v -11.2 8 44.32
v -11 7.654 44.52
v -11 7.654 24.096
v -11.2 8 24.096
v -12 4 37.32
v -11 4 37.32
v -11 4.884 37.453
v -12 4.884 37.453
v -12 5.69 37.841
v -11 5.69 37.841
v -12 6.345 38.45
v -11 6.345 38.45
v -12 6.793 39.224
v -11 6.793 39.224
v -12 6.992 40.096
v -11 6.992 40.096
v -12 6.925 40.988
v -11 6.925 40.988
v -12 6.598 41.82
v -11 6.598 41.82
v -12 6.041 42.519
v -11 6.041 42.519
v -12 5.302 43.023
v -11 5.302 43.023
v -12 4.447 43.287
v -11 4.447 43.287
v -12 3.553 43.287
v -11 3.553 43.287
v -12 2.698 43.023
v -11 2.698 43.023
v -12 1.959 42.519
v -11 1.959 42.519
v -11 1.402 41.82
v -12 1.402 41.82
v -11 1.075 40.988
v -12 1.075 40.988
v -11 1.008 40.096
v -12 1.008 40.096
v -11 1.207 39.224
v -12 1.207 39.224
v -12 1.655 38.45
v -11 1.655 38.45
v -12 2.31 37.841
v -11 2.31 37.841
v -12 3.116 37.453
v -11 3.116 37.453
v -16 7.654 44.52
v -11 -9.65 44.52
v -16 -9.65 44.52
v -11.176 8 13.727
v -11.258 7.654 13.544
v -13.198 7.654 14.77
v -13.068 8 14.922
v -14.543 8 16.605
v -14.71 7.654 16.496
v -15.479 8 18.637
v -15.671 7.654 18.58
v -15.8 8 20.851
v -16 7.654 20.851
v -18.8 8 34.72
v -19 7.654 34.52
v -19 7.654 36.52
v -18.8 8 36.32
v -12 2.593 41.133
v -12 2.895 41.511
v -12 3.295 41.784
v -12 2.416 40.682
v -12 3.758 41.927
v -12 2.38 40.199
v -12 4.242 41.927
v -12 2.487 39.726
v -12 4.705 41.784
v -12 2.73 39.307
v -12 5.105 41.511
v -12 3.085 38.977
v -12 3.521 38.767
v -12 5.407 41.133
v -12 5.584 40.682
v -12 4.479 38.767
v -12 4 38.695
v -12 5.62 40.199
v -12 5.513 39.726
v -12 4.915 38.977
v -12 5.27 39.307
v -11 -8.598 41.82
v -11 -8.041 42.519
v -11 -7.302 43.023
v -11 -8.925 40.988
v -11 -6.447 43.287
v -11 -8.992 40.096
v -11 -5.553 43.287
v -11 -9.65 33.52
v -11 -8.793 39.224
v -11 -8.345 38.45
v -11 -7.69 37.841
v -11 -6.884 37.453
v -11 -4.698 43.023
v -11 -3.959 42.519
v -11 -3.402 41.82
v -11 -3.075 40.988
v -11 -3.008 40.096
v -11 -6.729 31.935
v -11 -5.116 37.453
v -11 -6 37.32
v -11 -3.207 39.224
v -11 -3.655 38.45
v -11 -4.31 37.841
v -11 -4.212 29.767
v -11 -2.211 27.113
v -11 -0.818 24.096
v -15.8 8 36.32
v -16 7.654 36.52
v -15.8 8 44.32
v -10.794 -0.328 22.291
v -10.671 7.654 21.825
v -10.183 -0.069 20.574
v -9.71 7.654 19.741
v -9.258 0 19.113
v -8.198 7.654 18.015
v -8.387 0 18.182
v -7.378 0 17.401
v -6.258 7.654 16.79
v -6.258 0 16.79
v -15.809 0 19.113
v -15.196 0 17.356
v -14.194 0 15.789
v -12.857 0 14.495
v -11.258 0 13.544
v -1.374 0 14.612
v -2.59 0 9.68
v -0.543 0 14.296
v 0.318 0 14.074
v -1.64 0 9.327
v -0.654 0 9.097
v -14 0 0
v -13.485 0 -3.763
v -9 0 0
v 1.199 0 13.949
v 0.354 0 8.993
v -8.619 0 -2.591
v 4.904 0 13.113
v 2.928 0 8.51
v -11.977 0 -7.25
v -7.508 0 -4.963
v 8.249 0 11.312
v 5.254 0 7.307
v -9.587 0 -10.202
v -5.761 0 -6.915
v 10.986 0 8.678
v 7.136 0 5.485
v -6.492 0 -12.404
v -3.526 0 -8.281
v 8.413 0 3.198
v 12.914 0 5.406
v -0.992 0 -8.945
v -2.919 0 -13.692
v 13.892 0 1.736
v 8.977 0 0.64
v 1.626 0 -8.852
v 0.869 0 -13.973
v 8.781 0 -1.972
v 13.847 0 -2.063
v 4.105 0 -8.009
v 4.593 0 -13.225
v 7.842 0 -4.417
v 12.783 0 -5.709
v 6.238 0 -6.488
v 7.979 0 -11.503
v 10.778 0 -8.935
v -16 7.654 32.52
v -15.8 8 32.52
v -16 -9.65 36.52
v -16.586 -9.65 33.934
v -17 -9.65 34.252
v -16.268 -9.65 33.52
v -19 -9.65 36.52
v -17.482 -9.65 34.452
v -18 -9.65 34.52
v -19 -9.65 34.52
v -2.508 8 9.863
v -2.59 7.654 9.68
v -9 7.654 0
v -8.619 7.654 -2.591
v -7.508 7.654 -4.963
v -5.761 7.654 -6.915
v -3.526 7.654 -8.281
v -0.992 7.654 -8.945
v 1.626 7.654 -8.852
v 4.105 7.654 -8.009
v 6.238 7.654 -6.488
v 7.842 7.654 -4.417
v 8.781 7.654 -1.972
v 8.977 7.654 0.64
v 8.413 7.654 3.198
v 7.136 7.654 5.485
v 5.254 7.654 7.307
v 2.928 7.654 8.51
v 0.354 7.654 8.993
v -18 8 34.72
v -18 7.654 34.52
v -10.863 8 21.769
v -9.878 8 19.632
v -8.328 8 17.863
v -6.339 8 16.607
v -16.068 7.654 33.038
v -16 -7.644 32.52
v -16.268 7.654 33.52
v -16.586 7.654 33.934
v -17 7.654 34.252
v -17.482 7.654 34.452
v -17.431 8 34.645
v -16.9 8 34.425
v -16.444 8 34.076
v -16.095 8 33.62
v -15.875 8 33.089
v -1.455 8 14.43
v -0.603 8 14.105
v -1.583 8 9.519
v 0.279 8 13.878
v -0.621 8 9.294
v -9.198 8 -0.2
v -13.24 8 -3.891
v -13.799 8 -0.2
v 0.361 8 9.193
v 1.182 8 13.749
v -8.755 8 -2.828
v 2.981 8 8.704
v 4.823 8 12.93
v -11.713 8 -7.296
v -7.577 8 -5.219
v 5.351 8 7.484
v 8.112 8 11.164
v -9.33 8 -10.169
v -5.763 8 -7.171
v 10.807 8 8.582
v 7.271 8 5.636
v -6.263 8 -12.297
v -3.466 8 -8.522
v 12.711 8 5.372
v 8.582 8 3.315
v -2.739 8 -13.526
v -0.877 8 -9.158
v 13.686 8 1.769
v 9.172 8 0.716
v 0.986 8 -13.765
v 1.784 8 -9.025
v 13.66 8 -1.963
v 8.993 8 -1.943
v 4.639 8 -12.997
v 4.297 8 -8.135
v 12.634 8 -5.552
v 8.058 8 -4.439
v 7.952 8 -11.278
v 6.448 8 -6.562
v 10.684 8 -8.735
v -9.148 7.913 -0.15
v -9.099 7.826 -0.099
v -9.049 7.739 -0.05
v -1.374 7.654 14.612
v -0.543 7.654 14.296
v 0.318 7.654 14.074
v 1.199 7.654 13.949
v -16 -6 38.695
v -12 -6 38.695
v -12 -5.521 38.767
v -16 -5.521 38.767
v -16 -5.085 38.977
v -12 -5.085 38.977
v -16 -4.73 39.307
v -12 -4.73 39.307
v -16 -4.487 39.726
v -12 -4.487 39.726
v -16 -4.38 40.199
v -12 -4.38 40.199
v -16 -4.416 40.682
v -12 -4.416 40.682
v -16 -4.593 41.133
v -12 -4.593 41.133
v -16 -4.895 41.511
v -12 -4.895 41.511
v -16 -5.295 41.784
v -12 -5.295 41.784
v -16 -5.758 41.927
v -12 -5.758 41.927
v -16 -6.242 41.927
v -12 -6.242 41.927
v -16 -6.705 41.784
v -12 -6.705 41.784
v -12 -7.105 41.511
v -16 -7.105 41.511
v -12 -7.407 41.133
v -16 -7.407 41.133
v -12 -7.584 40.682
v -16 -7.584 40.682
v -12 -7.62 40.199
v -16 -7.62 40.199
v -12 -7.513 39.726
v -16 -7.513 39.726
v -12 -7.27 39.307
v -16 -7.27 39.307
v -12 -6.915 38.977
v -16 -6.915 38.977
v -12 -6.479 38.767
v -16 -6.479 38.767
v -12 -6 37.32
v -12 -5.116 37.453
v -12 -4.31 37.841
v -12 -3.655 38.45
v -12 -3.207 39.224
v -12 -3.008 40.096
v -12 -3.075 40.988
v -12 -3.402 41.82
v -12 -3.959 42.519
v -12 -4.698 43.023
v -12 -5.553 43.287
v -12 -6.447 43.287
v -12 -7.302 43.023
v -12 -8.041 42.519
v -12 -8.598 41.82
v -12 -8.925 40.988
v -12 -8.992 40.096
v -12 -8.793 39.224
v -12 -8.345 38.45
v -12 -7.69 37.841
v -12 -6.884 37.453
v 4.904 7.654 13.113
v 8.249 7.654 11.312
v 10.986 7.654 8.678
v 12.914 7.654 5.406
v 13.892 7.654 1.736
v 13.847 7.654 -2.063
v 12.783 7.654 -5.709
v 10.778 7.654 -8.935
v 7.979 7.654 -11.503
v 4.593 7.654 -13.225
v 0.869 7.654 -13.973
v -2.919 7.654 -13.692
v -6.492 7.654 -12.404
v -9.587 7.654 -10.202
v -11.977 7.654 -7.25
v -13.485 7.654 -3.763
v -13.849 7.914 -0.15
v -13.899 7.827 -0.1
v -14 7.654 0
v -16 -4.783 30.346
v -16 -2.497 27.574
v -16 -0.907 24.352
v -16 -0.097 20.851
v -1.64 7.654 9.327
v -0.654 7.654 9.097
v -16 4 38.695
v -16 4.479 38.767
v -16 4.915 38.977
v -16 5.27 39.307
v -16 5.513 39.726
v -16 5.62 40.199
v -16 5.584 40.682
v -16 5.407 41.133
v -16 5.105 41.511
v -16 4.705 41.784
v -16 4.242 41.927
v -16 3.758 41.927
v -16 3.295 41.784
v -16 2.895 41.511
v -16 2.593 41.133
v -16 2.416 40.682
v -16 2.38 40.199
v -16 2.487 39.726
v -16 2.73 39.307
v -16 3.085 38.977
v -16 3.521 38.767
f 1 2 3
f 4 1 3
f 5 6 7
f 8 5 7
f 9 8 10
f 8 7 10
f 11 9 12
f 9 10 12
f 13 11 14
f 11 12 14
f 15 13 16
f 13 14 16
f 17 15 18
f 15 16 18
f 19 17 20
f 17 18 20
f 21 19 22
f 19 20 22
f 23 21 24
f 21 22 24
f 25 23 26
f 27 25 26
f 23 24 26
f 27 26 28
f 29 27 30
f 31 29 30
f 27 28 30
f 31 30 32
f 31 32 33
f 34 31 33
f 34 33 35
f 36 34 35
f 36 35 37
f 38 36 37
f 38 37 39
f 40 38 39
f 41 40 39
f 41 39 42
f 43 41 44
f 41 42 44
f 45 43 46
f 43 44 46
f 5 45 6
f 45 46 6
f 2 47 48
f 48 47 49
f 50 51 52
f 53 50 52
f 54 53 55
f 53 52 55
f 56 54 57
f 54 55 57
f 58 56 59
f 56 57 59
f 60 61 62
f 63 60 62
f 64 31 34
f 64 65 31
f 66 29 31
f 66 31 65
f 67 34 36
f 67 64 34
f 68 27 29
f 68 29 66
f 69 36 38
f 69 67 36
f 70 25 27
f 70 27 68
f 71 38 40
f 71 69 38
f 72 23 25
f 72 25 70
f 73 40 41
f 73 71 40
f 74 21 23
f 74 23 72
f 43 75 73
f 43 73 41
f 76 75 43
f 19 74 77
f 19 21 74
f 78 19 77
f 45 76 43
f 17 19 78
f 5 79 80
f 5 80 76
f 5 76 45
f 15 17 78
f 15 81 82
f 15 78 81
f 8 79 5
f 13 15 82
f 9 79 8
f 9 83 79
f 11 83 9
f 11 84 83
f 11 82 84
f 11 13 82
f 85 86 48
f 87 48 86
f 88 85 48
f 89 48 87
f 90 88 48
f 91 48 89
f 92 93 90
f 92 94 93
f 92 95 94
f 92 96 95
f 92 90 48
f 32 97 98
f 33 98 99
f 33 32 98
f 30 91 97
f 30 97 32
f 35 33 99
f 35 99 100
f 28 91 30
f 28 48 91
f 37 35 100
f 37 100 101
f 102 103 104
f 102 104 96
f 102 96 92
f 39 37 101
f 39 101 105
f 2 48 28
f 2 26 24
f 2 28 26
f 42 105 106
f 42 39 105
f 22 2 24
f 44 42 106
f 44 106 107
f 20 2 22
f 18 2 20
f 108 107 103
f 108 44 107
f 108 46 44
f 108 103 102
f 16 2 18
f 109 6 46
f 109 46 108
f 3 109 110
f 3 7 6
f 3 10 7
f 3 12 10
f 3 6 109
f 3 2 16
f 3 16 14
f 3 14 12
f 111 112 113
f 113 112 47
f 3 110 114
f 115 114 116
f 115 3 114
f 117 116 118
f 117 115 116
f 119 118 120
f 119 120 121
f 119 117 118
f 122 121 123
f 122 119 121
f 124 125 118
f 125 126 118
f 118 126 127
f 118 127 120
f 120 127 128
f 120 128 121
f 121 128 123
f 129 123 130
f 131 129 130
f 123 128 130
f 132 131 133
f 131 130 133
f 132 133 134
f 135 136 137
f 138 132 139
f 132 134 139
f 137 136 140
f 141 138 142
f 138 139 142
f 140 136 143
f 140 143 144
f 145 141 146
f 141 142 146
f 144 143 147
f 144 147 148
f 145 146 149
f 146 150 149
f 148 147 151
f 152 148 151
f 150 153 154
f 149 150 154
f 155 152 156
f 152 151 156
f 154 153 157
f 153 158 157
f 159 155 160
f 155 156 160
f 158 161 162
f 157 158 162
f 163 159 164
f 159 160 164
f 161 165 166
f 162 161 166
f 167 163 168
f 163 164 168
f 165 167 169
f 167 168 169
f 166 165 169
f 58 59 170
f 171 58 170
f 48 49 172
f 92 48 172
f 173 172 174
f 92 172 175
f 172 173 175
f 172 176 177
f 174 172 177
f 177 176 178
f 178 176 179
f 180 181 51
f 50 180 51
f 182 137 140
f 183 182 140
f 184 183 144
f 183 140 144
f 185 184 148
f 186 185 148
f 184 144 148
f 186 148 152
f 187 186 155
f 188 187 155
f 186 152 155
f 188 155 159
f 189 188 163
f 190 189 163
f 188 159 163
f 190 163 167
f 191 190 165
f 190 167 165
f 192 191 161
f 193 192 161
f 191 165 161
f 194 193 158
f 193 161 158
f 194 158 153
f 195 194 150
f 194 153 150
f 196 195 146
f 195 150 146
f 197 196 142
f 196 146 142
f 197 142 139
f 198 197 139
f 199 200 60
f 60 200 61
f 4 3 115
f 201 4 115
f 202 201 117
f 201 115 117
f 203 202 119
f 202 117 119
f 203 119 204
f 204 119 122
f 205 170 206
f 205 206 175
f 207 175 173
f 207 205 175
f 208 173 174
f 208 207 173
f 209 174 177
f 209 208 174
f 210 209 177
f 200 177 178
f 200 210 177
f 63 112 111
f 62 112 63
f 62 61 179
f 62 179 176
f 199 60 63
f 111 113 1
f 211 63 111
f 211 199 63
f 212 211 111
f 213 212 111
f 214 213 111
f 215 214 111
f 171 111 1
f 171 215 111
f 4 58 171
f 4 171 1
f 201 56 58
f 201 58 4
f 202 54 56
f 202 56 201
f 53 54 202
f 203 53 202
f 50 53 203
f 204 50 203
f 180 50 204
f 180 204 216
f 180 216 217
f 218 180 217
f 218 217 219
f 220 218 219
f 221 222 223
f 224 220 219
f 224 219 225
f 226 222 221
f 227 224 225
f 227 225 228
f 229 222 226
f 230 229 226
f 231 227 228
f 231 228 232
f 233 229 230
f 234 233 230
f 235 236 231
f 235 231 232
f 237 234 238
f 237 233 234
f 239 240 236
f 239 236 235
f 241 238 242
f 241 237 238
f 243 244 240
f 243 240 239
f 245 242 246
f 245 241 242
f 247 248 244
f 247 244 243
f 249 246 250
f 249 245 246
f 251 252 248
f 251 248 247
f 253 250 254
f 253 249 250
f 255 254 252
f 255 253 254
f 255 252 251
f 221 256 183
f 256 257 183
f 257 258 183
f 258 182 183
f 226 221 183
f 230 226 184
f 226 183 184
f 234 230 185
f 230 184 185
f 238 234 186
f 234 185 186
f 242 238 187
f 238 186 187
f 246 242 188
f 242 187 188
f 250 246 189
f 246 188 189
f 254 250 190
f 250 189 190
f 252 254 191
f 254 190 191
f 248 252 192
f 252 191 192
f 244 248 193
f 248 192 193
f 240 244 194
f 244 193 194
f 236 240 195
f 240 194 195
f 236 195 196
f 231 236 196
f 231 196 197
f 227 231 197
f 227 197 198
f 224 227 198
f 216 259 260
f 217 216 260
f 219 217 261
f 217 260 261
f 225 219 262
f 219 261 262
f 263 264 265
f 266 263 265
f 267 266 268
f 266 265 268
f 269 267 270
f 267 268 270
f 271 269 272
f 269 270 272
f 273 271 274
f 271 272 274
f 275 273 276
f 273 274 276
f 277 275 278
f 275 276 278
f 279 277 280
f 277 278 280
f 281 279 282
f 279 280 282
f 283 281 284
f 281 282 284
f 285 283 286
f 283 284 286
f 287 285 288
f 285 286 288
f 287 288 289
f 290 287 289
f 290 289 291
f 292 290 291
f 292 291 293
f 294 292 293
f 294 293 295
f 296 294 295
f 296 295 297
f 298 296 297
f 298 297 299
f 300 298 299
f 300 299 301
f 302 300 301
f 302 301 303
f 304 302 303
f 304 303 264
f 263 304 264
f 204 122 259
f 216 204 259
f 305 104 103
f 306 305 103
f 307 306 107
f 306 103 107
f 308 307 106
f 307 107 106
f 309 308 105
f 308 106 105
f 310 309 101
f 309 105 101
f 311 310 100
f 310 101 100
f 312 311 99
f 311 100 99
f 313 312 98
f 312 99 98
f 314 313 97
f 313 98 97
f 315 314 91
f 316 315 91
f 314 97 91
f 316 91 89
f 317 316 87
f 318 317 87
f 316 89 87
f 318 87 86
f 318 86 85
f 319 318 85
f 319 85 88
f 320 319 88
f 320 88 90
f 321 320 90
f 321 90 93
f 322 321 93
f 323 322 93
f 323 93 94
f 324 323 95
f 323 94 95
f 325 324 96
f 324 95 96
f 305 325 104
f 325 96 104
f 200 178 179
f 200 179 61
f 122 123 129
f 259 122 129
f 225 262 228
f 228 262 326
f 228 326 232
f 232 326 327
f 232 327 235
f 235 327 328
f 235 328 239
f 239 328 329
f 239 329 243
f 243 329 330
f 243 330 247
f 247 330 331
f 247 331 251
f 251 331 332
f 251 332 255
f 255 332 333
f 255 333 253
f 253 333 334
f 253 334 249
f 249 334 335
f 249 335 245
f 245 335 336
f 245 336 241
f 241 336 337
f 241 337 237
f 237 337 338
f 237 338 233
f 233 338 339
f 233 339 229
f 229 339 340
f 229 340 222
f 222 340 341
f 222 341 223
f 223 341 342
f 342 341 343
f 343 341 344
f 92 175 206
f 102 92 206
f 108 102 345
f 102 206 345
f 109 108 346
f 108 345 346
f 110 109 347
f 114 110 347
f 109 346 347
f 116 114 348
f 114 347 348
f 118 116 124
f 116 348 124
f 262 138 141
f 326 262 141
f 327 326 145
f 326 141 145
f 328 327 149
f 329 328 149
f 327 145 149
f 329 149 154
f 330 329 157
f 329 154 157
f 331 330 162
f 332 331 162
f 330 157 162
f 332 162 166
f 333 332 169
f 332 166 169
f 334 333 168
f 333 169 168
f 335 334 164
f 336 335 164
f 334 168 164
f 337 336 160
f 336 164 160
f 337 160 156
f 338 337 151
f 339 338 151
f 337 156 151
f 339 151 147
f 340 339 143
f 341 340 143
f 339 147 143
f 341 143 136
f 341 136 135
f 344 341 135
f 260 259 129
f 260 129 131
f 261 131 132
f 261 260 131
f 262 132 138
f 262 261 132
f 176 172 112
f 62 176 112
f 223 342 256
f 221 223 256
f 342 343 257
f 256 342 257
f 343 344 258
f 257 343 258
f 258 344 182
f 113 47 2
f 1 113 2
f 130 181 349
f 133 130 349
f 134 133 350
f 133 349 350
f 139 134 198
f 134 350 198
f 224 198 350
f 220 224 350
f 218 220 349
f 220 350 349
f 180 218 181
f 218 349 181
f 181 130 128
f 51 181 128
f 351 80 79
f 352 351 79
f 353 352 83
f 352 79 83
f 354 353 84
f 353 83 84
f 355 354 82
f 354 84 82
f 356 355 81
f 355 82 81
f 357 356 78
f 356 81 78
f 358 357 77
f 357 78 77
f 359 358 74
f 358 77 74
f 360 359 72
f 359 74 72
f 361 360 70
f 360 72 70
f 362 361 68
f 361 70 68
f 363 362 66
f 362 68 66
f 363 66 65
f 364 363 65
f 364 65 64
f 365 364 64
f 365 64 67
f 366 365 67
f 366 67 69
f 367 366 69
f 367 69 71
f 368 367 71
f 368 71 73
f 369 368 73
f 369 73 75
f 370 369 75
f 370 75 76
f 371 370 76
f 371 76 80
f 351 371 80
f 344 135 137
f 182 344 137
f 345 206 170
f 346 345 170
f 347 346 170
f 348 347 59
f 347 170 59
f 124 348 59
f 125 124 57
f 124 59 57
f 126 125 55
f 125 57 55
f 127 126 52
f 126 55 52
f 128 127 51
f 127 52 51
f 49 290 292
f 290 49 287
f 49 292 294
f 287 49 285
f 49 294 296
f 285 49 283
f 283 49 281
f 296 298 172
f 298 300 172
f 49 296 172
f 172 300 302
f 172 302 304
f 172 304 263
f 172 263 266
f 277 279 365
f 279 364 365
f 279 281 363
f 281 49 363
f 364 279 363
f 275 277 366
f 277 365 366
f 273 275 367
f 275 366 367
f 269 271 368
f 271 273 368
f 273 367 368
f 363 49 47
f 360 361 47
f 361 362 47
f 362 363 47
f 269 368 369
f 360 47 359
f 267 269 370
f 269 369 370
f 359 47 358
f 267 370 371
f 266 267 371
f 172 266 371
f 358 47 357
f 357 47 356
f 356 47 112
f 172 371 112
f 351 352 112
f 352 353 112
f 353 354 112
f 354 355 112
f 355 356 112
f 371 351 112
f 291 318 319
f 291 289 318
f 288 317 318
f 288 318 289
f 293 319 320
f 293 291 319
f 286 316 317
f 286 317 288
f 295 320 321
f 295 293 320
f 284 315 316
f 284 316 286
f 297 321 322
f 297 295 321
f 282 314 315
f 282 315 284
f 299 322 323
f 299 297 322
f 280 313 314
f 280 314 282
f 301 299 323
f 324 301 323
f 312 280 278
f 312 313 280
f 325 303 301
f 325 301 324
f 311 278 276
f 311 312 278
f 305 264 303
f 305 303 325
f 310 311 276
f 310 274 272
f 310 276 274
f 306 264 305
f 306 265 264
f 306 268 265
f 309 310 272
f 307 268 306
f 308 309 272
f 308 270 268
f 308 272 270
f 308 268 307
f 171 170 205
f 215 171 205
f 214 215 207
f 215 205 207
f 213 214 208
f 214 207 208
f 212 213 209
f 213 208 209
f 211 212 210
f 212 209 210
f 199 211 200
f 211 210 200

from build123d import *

# Parameters (mm, degrees)
BOSS_EXTRUDE1_DEPTH = 8
BOSS_EXTRUDE2_DEPTH = 5
FILLET1_R           = 8
SKETCH3_R           = 1.625
CUT_EXTRUDE1_DEPTH  = 52.963032648
SKETCH4_R           = 3
CUT_EXTRUDE2_DEPTH  = 1
SKETCH5_W           = 2
SKETCH5_H           = 17.649761518
BOSS_EXTRUDE3_DEPTH = 3
FILLET2_R           = 2
CHAMFER1_SIZE       = 0.2
CHAMFER1_SIZE2      = 0.346410162


with BuildPart() as part:
    # Sketch1 → Boss-Extrude1 (new body)
    with BuildSketch(Plane(origin=(0, 0, 0), x_dir=(1, 0, 0), z_dir=(0, 1, 0))):
        with BuildLine():
            Line((-16, -15.658779245), (-16, -44.520095044))
            Line((-16, -44.520095044), (-11, -44.520095044))
            Line((-11, -44.520095044), (-11, -18.904054542))
            Line((-11, -18.904054542), (0, -14))
            ThreePointArc((0, -14), (9.899494937, 9.899494937), (-14, 0))
            Line((-14, 0), (-9, 0))
            ThreePointArc((-9, 0), (6.691765492, 6.018328223), (-0.951050089, -8.949609138))
            Line((-0.951050089, -8.949609138), (-16, -15.658779245))
        make_face()
    extrude(amount=BOSS_EXTRUDE1_DEPTH)

    # Sketch2 → Boss-Extrude2 (add)
    with BuildSketch(Plane.ZY.offset(16)):
        with BuildLine():
            Line((44.520095044, 0), (44.520095044, -9.649761518))
            Line((44.520095044, -9.649761518), (33.520095044, -9.649761518))
            ThreePointArc((33.520095044, -9.649761518), (27.783236203, -2.635329296), (19.113239186, 0))
            Line((19.113239186, 0), (44.520095044, 0))
        make_face()
    extrude(amount=-BOSS_EXTRUDE2_DEPTH)

    # Fillet1
    fillet1_edges = [part.edges().sort_by_distance(p)[0] for p in [
        (0, 4, 14),
        (-11, 4, 18.904054542),
    ]]
    fillet(fillet1_edges, radius=FILLET1_R)
    fillet1_2_edges = [part.edges().sort_by_distance(p)[0] for p in [
        (-0.951050089, 4, 8.949609138),
        (-16, 4, 15.658779245),
    ]]
    fillet(fillet1_2_edges, radius=FILLET1_R)

    # Sketch3 → Cut-Extrude1 (cut, through all)
    with BuildSketch(Plane(origin=(-11, 0, 0), x_dir=(0, 0, -1), z_dir=(1, 0, 0))):
        with Locations((-40.320095044, 4)):
            Circle(SKETCH3_R)
        with Locations((-40.320095044, -6)):
            Circle(SKETCH3_R)
    extrude(amount=-CUT_EXTRUDE1_DEPTH, mode=Mode.SUBTRACT)

    # Sketch4 → Cut-Extrude2 (cut)
    with BuildSketch(Plane(origin=(-11, 0, 0), x_dir=(0, 0, -1), z_dir=(1, 0, 0))):
        with Locations((-40.320095044, 4)):
            Circle(SKETCH4_R)
        with Locations((-40.320095044, -6)):
            Circle(SKETCH4_R)
    extrude(amount=-CUT_EXTRUDE2_DEPTH, mode=Mode.SUBTRACT)

    # Sketch5 → Boss-Extrude3 (add)
    with BuildSketch(Plane.ZY.offset(16)):
        with Locations((35.520095044, -0.824880759)):
            Rectangle(SKETCH5_W, SKETCH5_H)
    extrude(amount=BOSS_EXTRUDE3_DEPTH)

    # Fillet2
    fillet2_edges = [part.edges().sort_by_distance(p)[0] for p in [
        (-16, -0.824880759, 34.520095044),
    ]]
    fillet(fillet2_edges, radius=FILLET2_R)

    # Chamfer1
    chamfer1_edges = [part.edges().sort_by_distance(p)[0] for p in [
        (-16.585786438, 8, 33.934308606),
        (-11.5, 8, 0),
        (6.237696494, 8, -6.48776868),
        (-13.5, 8, 44.520095044),
        (-6.923574229, 8, 11.612298605),
        (-11, 8, 34.308295031),
        (-3.815638997, 8, 15.70110016),
        (9.46618809, 8, -10.314615022),
        (-16, 8, 26.685657382),
        (-14.710444905, 8, 16.495771504),
        (-1.150763069, 8, 9.19633523),
        (-0.11525428, 8, 14.172981147),
        (-9.710444905, 8, 19.741046801),
        (-16, 8, 40.520095044),
        (-17.5, 8, 36.520095044),
        (-18.5, 8, 34.520095044),
        (-19, 8, 35.520095044),
    ]]
    chamfer1_side = [part.faces().sort_by_distance(p)[0] for p in [
        (-15.328166574, 8, 26.685657382),
    ]]
    chamfer(chamfer1_edges, length=CHAMFER1_SIZE, length2=CHAMFER1_SIZE2, reference=chamfer1_side[0])


solid = part.part
